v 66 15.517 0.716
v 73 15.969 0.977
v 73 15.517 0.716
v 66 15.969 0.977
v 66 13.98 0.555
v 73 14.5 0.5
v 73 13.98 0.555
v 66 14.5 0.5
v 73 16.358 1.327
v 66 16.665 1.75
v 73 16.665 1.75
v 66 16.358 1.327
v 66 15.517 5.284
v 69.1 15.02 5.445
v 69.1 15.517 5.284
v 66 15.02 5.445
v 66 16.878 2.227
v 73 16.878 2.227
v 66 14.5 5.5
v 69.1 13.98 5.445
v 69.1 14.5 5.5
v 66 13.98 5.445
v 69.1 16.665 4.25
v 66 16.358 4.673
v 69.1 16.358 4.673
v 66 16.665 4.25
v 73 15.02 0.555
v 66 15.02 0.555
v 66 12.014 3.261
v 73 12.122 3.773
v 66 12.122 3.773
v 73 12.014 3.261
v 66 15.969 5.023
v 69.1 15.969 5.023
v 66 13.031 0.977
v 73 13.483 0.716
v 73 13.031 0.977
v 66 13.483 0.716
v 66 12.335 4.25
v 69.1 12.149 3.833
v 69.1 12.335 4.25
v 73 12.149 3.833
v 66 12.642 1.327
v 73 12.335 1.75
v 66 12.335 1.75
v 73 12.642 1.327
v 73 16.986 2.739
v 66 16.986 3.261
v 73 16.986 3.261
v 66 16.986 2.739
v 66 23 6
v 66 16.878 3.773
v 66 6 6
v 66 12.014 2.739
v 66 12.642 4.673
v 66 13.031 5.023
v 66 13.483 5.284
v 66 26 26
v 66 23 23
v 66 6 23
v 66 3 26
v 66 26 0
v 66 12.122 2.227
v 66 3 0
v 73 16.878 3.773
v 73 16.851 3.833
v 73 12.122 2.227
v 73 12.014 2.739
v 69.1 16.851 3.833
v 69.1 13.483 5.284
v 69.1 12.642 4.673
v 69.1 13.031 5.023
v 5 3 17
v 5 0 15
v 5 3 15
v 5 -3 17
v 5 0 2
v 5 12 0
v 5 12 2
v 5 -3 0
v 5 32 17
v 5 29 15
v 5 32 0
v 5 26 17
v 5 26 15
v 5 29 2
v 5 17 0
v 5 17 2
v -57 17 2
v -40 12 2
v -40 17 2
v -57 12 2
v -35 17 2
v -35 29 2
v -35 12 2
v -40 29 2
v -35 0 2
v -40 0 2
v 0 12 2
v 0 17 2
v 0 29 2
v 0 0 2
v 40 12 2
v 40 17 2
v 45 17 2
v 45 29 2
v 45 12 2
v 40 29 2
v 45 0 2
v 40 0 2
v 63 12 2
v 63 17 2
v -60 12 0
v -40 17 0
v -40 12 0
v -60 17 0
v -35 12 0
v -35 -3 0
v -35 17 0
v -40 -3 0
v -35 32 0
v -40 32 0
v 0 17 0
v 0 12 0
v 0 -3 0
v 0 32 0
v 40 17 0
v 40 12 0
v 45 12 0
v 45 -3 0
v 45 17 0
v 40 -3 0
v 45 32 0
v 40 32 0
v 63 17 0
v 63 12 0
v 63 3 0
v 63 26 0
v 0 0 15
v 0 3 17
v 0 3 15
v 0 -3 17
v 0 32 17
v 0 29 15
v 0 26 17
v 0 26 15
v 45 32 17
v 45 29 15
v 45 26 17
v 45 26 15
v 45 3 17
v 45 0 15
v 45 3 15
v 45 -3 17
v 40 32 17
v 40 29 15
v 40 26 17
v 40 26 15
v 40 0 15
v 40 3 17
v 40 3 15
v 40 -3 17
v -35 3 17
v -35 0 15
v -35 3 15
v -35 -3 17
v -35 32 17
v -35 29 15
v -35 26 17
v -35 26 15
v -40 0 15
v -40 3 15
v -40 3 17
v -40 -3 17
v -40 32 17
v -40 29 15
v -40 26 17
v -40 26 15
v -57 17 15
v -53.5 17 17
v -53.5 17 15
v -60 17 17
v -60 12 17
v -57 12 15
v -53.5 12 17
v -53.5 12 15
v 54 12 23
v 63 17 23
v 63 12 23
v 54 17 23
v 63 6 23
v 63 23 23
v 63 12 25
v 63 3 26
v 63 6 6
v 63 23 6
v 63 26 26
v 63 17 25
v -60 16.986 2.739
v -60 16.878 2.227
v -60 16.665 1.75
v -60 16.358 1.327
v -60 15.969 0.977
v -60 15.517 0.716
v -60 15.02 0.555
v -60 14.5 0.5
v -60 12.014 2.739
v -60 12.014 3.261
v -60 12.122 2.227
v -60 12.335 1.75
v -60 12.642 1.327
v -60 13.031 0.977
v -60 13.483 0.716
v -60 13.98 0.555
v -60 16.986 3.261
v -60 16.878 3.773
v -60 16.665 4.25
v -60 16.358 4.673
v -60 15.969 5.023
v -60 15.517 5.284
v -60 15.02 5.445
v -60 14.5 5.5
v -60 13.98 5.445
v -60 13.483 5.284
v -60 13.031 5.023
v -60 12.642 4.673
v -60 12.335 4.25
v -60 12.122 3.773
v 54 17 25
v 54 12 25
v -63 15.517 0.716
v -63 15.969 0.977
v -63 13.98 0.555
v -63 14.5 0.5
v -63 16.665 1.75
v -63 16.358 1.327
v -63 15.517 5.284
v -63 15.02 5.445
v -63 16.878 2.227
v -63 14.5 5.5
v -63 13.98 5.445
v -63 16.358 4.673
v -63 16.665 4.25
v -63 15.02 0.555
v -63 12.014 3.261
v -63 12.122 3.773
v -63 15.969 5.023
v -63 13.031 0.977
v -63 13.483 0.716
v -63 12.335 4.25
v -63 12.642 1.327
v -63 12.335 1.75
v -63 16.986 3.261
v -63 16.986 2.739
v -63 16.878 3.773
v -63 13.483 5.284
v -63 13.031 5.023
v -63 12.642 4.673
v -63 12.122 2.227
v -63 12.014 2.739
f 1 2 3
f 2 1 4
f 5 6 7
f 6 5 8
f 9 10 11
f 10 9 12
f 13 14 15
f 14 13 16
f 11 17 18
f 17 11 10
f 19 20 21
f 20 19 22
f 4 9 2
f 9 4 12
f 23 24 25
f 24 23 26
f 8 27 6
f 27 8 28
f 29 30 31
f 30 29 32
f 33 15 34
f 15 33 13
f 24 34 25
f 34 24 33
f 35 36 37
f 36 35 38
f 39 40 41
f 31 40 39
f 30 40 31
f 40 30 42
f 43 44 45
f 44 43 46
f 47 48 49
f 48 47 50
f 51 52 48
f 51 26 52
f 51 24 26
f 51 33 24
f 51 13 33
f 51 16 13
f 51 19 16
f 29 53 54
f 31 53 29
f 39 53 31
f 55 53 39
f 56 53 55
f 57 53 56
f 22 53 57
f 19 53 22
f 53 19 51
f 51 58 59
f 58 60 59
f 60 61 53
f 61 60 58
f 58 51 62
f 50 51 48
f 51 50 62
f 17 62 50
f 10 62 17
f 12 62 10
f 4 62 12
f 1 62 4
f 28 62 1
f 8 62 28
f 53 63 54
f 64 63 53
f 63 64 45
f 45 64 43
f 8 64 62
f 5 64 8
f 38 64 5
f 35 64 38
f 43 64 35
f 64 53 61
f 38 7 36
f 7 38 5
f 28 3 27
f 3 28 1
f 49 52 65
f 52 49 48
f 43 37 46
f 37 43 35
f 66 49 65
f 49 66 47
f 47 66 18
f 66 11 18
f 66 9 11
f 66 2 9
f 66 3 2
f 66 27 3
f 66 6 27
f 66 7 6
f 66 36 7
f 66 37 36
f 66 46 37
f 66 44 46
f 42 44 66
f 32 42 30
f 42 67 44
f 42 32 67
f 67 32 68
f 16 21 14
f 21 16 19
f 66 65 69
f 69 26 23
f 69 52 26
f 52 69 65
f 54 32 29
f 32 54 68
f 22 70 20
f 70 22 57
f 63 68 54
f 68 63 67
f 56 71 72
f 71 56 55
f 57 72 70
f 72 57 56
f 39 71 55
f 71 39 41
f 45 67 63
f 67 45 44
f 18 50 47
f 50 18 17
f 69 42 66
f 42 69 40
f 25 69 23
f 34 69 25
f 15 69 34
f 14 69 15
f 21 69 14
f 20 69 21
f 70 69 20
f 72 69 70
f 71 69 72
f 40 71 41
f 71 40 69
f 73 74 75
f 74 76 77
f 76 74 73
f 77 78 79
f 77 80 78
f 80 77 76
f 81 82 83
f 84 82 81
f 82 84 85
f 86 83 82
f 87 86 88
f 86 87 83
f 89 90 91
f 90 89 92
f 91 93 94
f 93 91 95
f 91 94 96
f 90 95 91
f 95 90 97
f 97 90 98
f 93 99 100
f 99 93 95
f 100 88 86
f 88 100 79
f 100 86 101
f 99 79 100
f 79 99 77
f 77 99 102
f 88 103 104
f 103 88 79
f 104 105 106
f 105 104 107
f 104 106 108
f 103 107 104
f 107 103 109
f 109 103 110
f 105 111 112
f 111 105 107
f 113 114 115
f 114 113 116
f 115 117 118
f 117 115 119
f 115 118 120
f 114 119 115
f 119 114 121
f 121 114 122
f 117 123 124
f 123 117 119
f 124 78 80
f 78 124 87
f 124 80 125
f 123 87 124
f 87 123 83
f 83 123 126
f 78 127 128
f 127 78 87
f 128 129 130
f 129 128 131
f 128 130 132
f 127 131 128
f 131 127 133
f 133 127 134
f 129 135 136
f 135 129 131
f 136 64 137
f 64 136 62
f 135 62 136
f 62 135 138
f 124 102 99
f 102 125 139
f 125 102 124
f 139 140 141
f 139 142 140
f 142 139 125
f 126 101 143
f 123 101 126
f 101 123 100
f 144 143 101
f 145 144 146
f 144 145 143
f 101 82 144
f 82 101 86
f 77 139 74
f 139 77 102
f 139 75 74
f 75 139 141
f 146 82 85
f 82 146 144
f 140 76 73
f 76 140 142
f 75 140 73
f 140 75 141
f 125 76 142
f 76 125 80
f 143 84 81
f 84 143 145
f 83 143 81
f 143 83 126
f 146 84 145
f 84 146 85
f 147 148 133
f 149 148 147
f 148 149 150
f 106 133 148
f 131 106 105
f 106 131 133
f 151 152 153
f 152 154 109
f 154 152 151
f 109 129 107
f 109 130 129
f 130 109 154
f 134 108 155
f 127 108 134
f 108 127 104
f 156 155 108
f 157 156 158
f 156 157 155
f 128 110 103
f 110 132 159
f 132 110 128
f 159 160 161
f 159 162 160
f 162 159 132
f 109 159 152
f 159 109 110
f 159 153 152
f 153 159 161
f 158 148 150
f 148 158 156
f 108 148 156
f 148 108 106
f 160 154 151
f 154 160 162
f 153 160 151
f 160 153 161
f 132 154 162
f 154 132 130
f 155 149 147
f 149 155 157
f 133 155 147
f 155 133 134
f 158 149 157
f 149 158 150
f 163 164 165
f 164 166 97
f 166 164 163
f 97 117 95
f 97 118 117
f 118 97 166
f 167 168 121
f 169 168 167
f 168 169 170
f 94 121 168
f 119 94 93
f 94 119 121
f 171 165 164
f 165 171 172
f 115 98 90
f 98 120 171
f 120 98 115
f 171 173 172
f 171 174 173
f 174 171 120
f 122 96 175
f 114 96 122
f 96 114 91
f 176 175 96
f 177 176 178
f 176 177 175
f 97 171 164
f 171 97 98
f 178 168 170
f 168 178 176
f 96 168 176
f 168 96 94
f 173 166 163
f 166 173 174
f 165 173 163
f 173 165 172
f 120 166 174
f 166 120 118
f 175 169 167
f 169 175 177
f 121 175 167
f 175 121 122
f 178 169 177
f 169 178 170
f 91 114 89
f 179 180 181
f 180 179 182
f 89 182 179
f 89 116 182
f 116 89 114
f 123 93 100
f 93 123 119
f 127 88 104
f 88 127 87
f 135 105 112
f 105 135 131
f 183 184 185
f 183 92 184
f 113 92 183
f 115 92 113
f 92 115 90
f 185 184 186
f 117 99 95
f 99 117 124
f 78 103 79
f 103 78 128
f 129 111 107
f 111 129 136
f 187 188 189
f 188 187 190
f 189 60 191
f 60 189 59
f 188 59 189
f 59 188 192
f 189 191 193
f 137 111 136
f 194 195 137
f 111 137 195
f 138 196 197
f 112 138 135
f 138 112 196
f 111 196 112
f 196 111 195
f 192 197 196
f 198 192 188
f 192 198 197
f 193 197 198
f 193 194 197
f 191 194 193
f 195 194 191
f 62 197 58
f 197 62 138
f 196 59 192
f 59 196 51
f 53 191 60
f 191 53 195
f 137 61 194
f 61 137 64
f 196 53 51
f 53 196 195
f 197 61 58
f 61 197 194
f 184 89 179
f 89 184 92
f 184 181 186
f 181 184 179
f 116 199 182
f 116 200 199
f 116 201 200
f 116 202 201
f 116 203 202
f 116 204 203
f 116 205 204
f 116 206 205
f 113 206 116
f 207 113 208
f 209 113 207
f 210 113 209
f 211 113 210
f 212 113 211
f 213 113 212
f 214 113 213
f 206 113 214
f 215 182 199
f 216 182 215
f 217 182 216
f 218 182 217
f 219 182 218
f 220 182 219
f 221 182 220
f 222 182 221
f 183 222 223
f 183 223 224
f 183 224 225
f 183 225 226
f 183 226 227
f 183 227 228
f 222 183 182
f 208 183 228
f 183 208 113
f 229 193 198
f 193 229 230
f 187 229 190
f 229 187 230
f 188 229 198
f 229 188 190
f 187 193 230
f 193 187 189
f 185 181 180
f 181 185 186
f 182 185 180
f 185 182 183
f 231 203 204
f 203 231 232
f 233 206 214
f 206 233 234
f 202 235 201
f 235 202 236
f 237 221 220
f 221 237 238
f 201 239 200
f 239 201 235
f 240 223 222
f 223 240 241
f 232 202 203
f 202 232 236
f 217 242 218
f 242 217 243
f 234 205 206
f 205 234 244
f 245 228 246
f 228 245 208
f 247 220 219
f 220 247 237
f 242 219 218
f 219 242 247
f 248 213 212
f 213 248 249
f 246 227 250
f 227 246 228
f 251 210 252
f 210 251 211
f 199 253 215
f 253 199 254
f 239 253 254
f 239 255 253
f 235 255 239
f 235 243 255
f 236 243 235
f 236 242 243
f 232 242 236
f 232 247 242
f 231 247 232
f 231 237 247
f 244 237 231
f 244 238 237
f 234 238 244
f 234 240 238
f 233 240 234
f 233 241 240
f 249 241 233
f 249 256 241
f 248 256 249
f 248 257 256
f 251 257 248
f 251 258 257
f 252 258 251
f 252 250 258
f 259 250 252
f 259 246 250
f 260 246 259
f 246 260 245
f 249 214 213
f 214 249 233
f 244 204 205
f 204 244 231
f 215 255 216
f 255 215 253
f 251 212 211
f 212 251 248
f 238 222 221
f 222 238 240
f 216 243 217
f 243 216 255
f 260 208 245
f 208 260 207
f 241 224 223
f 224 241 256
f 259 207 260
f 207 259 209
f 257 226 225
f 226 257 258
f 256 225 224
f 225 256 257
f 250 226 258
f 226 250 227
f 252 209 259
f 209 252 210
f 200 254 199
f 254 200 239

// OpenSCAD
$fn = 30;



CENTER_Y = 14.5;

//Horiz Bottom Bar
cube([5,29,2]);

translate([0,-2,0]){
cube([5,2,15]);
}

translate([0,29,0]){
cube([5,2,15]);
}

//Horiz Small Peg
translate([0,-3,15]){
cube([5,6,2]);
}

translate([0,26,15]){
cube([5,6,2]);
}



//Horiz Riser
translate([0,-3,0]){
cube([5,3,15]);
}

translate([0,29,0]){
    

cube([5,3,15]);
}


//Horiz 2
translate([40,,0,0]) cube([5,29,2]);


translate([40,-2,0]){
cube([5,2,15]);
}

translate([40,29,0]){
cube([5,2,15]);
}

//Horiz Small Peg
translate([40,-3,15]){
cube([5,6,2]);
}

translate([40,26,15]){
cube([5,6,2]);
}



//Horiz Riser
translate([40,-3,0]){
cube([5,3,15]);
}

translate([40,29,0]){
    

cube([5,3,15]);
}


translate([40,0,0]) cube([5,29,2]);

//Horiz 3

translate([-40,-2,0]){
cube([5,2,15]);
}

translate([-40,29,0]){
cube([5,2,15]);
}

//Horiz Small Peg
translate([-40,-3,15]){
cube([5,6,2]);
}

translate([-40,26,15]){
cube([5,6,2]);
}



//Horiz Riser
translate([-40,-3,0]){
cube([5,3,15]);
}

translate([-40,29,0]){
    

cube([5,3,15]);
}


translate([-40,0,0]) cube([5,29,2]);

//Vertical
translate([-57.5,(9.5+2.5),0]) cube([122, 5, 2]);


DOUBLE_RISER_H = 23;
DOUBLE_RISER_X = 63;

//Wire Double Prong Riser
translate([DOUBLE_RISER_X ,(9.5+2.5+11),0]){
cube([3,3,DOUBLE_RISER_H]);
}

translate([DOUBLE_RISER_X,(9.5+1.5-8),0]){
cube([3,3,DOUBLE_RISER_H]);
}

//Wire Double Prong Riser Connector Bottom
translate([DOUBLE_RISER_X,(9.5+2.5-8),0]){
cube([3,19,6]);
}

//Wire Double Prong Riser Connector Top
translate([DOUBLE_RISER_X,(9.5+1.5-8),DOUBLE_RISER_H]){
cube([3,23,3]);
}

//Non-Wire Riser
translate([-60,(9.5+2.5),0]){
cube([3,5,15]);
}



//Wire Small Peg
translate([54,(9.5+2.5),DOUBLE_RISER_H]){
cube([10,5,2]);
}

//Non-Wire Small Peg
translate([-60,(9.5+2.5),15]){
cube([6.5,5,2]);
}

//Sweep Axles
//Wire
difference(){
translate([DOUBLE_RISER_X+3,CENTER_Y,3]){
    rotate([0,90,0]){
        cylinder(d=5, 7);}
}
translate([DOUBLE_RISER_X+3+5.1,CENTER_Y,3 + 2/3 * 5]){
cube([4,5,5],center=true);
}
}

//Non Wire
translate([-DOUBLE_RISER_X,CENTER_Y,3]){
    rotate([0,90,0]){
        cylinder(d=5, 3);}
}
